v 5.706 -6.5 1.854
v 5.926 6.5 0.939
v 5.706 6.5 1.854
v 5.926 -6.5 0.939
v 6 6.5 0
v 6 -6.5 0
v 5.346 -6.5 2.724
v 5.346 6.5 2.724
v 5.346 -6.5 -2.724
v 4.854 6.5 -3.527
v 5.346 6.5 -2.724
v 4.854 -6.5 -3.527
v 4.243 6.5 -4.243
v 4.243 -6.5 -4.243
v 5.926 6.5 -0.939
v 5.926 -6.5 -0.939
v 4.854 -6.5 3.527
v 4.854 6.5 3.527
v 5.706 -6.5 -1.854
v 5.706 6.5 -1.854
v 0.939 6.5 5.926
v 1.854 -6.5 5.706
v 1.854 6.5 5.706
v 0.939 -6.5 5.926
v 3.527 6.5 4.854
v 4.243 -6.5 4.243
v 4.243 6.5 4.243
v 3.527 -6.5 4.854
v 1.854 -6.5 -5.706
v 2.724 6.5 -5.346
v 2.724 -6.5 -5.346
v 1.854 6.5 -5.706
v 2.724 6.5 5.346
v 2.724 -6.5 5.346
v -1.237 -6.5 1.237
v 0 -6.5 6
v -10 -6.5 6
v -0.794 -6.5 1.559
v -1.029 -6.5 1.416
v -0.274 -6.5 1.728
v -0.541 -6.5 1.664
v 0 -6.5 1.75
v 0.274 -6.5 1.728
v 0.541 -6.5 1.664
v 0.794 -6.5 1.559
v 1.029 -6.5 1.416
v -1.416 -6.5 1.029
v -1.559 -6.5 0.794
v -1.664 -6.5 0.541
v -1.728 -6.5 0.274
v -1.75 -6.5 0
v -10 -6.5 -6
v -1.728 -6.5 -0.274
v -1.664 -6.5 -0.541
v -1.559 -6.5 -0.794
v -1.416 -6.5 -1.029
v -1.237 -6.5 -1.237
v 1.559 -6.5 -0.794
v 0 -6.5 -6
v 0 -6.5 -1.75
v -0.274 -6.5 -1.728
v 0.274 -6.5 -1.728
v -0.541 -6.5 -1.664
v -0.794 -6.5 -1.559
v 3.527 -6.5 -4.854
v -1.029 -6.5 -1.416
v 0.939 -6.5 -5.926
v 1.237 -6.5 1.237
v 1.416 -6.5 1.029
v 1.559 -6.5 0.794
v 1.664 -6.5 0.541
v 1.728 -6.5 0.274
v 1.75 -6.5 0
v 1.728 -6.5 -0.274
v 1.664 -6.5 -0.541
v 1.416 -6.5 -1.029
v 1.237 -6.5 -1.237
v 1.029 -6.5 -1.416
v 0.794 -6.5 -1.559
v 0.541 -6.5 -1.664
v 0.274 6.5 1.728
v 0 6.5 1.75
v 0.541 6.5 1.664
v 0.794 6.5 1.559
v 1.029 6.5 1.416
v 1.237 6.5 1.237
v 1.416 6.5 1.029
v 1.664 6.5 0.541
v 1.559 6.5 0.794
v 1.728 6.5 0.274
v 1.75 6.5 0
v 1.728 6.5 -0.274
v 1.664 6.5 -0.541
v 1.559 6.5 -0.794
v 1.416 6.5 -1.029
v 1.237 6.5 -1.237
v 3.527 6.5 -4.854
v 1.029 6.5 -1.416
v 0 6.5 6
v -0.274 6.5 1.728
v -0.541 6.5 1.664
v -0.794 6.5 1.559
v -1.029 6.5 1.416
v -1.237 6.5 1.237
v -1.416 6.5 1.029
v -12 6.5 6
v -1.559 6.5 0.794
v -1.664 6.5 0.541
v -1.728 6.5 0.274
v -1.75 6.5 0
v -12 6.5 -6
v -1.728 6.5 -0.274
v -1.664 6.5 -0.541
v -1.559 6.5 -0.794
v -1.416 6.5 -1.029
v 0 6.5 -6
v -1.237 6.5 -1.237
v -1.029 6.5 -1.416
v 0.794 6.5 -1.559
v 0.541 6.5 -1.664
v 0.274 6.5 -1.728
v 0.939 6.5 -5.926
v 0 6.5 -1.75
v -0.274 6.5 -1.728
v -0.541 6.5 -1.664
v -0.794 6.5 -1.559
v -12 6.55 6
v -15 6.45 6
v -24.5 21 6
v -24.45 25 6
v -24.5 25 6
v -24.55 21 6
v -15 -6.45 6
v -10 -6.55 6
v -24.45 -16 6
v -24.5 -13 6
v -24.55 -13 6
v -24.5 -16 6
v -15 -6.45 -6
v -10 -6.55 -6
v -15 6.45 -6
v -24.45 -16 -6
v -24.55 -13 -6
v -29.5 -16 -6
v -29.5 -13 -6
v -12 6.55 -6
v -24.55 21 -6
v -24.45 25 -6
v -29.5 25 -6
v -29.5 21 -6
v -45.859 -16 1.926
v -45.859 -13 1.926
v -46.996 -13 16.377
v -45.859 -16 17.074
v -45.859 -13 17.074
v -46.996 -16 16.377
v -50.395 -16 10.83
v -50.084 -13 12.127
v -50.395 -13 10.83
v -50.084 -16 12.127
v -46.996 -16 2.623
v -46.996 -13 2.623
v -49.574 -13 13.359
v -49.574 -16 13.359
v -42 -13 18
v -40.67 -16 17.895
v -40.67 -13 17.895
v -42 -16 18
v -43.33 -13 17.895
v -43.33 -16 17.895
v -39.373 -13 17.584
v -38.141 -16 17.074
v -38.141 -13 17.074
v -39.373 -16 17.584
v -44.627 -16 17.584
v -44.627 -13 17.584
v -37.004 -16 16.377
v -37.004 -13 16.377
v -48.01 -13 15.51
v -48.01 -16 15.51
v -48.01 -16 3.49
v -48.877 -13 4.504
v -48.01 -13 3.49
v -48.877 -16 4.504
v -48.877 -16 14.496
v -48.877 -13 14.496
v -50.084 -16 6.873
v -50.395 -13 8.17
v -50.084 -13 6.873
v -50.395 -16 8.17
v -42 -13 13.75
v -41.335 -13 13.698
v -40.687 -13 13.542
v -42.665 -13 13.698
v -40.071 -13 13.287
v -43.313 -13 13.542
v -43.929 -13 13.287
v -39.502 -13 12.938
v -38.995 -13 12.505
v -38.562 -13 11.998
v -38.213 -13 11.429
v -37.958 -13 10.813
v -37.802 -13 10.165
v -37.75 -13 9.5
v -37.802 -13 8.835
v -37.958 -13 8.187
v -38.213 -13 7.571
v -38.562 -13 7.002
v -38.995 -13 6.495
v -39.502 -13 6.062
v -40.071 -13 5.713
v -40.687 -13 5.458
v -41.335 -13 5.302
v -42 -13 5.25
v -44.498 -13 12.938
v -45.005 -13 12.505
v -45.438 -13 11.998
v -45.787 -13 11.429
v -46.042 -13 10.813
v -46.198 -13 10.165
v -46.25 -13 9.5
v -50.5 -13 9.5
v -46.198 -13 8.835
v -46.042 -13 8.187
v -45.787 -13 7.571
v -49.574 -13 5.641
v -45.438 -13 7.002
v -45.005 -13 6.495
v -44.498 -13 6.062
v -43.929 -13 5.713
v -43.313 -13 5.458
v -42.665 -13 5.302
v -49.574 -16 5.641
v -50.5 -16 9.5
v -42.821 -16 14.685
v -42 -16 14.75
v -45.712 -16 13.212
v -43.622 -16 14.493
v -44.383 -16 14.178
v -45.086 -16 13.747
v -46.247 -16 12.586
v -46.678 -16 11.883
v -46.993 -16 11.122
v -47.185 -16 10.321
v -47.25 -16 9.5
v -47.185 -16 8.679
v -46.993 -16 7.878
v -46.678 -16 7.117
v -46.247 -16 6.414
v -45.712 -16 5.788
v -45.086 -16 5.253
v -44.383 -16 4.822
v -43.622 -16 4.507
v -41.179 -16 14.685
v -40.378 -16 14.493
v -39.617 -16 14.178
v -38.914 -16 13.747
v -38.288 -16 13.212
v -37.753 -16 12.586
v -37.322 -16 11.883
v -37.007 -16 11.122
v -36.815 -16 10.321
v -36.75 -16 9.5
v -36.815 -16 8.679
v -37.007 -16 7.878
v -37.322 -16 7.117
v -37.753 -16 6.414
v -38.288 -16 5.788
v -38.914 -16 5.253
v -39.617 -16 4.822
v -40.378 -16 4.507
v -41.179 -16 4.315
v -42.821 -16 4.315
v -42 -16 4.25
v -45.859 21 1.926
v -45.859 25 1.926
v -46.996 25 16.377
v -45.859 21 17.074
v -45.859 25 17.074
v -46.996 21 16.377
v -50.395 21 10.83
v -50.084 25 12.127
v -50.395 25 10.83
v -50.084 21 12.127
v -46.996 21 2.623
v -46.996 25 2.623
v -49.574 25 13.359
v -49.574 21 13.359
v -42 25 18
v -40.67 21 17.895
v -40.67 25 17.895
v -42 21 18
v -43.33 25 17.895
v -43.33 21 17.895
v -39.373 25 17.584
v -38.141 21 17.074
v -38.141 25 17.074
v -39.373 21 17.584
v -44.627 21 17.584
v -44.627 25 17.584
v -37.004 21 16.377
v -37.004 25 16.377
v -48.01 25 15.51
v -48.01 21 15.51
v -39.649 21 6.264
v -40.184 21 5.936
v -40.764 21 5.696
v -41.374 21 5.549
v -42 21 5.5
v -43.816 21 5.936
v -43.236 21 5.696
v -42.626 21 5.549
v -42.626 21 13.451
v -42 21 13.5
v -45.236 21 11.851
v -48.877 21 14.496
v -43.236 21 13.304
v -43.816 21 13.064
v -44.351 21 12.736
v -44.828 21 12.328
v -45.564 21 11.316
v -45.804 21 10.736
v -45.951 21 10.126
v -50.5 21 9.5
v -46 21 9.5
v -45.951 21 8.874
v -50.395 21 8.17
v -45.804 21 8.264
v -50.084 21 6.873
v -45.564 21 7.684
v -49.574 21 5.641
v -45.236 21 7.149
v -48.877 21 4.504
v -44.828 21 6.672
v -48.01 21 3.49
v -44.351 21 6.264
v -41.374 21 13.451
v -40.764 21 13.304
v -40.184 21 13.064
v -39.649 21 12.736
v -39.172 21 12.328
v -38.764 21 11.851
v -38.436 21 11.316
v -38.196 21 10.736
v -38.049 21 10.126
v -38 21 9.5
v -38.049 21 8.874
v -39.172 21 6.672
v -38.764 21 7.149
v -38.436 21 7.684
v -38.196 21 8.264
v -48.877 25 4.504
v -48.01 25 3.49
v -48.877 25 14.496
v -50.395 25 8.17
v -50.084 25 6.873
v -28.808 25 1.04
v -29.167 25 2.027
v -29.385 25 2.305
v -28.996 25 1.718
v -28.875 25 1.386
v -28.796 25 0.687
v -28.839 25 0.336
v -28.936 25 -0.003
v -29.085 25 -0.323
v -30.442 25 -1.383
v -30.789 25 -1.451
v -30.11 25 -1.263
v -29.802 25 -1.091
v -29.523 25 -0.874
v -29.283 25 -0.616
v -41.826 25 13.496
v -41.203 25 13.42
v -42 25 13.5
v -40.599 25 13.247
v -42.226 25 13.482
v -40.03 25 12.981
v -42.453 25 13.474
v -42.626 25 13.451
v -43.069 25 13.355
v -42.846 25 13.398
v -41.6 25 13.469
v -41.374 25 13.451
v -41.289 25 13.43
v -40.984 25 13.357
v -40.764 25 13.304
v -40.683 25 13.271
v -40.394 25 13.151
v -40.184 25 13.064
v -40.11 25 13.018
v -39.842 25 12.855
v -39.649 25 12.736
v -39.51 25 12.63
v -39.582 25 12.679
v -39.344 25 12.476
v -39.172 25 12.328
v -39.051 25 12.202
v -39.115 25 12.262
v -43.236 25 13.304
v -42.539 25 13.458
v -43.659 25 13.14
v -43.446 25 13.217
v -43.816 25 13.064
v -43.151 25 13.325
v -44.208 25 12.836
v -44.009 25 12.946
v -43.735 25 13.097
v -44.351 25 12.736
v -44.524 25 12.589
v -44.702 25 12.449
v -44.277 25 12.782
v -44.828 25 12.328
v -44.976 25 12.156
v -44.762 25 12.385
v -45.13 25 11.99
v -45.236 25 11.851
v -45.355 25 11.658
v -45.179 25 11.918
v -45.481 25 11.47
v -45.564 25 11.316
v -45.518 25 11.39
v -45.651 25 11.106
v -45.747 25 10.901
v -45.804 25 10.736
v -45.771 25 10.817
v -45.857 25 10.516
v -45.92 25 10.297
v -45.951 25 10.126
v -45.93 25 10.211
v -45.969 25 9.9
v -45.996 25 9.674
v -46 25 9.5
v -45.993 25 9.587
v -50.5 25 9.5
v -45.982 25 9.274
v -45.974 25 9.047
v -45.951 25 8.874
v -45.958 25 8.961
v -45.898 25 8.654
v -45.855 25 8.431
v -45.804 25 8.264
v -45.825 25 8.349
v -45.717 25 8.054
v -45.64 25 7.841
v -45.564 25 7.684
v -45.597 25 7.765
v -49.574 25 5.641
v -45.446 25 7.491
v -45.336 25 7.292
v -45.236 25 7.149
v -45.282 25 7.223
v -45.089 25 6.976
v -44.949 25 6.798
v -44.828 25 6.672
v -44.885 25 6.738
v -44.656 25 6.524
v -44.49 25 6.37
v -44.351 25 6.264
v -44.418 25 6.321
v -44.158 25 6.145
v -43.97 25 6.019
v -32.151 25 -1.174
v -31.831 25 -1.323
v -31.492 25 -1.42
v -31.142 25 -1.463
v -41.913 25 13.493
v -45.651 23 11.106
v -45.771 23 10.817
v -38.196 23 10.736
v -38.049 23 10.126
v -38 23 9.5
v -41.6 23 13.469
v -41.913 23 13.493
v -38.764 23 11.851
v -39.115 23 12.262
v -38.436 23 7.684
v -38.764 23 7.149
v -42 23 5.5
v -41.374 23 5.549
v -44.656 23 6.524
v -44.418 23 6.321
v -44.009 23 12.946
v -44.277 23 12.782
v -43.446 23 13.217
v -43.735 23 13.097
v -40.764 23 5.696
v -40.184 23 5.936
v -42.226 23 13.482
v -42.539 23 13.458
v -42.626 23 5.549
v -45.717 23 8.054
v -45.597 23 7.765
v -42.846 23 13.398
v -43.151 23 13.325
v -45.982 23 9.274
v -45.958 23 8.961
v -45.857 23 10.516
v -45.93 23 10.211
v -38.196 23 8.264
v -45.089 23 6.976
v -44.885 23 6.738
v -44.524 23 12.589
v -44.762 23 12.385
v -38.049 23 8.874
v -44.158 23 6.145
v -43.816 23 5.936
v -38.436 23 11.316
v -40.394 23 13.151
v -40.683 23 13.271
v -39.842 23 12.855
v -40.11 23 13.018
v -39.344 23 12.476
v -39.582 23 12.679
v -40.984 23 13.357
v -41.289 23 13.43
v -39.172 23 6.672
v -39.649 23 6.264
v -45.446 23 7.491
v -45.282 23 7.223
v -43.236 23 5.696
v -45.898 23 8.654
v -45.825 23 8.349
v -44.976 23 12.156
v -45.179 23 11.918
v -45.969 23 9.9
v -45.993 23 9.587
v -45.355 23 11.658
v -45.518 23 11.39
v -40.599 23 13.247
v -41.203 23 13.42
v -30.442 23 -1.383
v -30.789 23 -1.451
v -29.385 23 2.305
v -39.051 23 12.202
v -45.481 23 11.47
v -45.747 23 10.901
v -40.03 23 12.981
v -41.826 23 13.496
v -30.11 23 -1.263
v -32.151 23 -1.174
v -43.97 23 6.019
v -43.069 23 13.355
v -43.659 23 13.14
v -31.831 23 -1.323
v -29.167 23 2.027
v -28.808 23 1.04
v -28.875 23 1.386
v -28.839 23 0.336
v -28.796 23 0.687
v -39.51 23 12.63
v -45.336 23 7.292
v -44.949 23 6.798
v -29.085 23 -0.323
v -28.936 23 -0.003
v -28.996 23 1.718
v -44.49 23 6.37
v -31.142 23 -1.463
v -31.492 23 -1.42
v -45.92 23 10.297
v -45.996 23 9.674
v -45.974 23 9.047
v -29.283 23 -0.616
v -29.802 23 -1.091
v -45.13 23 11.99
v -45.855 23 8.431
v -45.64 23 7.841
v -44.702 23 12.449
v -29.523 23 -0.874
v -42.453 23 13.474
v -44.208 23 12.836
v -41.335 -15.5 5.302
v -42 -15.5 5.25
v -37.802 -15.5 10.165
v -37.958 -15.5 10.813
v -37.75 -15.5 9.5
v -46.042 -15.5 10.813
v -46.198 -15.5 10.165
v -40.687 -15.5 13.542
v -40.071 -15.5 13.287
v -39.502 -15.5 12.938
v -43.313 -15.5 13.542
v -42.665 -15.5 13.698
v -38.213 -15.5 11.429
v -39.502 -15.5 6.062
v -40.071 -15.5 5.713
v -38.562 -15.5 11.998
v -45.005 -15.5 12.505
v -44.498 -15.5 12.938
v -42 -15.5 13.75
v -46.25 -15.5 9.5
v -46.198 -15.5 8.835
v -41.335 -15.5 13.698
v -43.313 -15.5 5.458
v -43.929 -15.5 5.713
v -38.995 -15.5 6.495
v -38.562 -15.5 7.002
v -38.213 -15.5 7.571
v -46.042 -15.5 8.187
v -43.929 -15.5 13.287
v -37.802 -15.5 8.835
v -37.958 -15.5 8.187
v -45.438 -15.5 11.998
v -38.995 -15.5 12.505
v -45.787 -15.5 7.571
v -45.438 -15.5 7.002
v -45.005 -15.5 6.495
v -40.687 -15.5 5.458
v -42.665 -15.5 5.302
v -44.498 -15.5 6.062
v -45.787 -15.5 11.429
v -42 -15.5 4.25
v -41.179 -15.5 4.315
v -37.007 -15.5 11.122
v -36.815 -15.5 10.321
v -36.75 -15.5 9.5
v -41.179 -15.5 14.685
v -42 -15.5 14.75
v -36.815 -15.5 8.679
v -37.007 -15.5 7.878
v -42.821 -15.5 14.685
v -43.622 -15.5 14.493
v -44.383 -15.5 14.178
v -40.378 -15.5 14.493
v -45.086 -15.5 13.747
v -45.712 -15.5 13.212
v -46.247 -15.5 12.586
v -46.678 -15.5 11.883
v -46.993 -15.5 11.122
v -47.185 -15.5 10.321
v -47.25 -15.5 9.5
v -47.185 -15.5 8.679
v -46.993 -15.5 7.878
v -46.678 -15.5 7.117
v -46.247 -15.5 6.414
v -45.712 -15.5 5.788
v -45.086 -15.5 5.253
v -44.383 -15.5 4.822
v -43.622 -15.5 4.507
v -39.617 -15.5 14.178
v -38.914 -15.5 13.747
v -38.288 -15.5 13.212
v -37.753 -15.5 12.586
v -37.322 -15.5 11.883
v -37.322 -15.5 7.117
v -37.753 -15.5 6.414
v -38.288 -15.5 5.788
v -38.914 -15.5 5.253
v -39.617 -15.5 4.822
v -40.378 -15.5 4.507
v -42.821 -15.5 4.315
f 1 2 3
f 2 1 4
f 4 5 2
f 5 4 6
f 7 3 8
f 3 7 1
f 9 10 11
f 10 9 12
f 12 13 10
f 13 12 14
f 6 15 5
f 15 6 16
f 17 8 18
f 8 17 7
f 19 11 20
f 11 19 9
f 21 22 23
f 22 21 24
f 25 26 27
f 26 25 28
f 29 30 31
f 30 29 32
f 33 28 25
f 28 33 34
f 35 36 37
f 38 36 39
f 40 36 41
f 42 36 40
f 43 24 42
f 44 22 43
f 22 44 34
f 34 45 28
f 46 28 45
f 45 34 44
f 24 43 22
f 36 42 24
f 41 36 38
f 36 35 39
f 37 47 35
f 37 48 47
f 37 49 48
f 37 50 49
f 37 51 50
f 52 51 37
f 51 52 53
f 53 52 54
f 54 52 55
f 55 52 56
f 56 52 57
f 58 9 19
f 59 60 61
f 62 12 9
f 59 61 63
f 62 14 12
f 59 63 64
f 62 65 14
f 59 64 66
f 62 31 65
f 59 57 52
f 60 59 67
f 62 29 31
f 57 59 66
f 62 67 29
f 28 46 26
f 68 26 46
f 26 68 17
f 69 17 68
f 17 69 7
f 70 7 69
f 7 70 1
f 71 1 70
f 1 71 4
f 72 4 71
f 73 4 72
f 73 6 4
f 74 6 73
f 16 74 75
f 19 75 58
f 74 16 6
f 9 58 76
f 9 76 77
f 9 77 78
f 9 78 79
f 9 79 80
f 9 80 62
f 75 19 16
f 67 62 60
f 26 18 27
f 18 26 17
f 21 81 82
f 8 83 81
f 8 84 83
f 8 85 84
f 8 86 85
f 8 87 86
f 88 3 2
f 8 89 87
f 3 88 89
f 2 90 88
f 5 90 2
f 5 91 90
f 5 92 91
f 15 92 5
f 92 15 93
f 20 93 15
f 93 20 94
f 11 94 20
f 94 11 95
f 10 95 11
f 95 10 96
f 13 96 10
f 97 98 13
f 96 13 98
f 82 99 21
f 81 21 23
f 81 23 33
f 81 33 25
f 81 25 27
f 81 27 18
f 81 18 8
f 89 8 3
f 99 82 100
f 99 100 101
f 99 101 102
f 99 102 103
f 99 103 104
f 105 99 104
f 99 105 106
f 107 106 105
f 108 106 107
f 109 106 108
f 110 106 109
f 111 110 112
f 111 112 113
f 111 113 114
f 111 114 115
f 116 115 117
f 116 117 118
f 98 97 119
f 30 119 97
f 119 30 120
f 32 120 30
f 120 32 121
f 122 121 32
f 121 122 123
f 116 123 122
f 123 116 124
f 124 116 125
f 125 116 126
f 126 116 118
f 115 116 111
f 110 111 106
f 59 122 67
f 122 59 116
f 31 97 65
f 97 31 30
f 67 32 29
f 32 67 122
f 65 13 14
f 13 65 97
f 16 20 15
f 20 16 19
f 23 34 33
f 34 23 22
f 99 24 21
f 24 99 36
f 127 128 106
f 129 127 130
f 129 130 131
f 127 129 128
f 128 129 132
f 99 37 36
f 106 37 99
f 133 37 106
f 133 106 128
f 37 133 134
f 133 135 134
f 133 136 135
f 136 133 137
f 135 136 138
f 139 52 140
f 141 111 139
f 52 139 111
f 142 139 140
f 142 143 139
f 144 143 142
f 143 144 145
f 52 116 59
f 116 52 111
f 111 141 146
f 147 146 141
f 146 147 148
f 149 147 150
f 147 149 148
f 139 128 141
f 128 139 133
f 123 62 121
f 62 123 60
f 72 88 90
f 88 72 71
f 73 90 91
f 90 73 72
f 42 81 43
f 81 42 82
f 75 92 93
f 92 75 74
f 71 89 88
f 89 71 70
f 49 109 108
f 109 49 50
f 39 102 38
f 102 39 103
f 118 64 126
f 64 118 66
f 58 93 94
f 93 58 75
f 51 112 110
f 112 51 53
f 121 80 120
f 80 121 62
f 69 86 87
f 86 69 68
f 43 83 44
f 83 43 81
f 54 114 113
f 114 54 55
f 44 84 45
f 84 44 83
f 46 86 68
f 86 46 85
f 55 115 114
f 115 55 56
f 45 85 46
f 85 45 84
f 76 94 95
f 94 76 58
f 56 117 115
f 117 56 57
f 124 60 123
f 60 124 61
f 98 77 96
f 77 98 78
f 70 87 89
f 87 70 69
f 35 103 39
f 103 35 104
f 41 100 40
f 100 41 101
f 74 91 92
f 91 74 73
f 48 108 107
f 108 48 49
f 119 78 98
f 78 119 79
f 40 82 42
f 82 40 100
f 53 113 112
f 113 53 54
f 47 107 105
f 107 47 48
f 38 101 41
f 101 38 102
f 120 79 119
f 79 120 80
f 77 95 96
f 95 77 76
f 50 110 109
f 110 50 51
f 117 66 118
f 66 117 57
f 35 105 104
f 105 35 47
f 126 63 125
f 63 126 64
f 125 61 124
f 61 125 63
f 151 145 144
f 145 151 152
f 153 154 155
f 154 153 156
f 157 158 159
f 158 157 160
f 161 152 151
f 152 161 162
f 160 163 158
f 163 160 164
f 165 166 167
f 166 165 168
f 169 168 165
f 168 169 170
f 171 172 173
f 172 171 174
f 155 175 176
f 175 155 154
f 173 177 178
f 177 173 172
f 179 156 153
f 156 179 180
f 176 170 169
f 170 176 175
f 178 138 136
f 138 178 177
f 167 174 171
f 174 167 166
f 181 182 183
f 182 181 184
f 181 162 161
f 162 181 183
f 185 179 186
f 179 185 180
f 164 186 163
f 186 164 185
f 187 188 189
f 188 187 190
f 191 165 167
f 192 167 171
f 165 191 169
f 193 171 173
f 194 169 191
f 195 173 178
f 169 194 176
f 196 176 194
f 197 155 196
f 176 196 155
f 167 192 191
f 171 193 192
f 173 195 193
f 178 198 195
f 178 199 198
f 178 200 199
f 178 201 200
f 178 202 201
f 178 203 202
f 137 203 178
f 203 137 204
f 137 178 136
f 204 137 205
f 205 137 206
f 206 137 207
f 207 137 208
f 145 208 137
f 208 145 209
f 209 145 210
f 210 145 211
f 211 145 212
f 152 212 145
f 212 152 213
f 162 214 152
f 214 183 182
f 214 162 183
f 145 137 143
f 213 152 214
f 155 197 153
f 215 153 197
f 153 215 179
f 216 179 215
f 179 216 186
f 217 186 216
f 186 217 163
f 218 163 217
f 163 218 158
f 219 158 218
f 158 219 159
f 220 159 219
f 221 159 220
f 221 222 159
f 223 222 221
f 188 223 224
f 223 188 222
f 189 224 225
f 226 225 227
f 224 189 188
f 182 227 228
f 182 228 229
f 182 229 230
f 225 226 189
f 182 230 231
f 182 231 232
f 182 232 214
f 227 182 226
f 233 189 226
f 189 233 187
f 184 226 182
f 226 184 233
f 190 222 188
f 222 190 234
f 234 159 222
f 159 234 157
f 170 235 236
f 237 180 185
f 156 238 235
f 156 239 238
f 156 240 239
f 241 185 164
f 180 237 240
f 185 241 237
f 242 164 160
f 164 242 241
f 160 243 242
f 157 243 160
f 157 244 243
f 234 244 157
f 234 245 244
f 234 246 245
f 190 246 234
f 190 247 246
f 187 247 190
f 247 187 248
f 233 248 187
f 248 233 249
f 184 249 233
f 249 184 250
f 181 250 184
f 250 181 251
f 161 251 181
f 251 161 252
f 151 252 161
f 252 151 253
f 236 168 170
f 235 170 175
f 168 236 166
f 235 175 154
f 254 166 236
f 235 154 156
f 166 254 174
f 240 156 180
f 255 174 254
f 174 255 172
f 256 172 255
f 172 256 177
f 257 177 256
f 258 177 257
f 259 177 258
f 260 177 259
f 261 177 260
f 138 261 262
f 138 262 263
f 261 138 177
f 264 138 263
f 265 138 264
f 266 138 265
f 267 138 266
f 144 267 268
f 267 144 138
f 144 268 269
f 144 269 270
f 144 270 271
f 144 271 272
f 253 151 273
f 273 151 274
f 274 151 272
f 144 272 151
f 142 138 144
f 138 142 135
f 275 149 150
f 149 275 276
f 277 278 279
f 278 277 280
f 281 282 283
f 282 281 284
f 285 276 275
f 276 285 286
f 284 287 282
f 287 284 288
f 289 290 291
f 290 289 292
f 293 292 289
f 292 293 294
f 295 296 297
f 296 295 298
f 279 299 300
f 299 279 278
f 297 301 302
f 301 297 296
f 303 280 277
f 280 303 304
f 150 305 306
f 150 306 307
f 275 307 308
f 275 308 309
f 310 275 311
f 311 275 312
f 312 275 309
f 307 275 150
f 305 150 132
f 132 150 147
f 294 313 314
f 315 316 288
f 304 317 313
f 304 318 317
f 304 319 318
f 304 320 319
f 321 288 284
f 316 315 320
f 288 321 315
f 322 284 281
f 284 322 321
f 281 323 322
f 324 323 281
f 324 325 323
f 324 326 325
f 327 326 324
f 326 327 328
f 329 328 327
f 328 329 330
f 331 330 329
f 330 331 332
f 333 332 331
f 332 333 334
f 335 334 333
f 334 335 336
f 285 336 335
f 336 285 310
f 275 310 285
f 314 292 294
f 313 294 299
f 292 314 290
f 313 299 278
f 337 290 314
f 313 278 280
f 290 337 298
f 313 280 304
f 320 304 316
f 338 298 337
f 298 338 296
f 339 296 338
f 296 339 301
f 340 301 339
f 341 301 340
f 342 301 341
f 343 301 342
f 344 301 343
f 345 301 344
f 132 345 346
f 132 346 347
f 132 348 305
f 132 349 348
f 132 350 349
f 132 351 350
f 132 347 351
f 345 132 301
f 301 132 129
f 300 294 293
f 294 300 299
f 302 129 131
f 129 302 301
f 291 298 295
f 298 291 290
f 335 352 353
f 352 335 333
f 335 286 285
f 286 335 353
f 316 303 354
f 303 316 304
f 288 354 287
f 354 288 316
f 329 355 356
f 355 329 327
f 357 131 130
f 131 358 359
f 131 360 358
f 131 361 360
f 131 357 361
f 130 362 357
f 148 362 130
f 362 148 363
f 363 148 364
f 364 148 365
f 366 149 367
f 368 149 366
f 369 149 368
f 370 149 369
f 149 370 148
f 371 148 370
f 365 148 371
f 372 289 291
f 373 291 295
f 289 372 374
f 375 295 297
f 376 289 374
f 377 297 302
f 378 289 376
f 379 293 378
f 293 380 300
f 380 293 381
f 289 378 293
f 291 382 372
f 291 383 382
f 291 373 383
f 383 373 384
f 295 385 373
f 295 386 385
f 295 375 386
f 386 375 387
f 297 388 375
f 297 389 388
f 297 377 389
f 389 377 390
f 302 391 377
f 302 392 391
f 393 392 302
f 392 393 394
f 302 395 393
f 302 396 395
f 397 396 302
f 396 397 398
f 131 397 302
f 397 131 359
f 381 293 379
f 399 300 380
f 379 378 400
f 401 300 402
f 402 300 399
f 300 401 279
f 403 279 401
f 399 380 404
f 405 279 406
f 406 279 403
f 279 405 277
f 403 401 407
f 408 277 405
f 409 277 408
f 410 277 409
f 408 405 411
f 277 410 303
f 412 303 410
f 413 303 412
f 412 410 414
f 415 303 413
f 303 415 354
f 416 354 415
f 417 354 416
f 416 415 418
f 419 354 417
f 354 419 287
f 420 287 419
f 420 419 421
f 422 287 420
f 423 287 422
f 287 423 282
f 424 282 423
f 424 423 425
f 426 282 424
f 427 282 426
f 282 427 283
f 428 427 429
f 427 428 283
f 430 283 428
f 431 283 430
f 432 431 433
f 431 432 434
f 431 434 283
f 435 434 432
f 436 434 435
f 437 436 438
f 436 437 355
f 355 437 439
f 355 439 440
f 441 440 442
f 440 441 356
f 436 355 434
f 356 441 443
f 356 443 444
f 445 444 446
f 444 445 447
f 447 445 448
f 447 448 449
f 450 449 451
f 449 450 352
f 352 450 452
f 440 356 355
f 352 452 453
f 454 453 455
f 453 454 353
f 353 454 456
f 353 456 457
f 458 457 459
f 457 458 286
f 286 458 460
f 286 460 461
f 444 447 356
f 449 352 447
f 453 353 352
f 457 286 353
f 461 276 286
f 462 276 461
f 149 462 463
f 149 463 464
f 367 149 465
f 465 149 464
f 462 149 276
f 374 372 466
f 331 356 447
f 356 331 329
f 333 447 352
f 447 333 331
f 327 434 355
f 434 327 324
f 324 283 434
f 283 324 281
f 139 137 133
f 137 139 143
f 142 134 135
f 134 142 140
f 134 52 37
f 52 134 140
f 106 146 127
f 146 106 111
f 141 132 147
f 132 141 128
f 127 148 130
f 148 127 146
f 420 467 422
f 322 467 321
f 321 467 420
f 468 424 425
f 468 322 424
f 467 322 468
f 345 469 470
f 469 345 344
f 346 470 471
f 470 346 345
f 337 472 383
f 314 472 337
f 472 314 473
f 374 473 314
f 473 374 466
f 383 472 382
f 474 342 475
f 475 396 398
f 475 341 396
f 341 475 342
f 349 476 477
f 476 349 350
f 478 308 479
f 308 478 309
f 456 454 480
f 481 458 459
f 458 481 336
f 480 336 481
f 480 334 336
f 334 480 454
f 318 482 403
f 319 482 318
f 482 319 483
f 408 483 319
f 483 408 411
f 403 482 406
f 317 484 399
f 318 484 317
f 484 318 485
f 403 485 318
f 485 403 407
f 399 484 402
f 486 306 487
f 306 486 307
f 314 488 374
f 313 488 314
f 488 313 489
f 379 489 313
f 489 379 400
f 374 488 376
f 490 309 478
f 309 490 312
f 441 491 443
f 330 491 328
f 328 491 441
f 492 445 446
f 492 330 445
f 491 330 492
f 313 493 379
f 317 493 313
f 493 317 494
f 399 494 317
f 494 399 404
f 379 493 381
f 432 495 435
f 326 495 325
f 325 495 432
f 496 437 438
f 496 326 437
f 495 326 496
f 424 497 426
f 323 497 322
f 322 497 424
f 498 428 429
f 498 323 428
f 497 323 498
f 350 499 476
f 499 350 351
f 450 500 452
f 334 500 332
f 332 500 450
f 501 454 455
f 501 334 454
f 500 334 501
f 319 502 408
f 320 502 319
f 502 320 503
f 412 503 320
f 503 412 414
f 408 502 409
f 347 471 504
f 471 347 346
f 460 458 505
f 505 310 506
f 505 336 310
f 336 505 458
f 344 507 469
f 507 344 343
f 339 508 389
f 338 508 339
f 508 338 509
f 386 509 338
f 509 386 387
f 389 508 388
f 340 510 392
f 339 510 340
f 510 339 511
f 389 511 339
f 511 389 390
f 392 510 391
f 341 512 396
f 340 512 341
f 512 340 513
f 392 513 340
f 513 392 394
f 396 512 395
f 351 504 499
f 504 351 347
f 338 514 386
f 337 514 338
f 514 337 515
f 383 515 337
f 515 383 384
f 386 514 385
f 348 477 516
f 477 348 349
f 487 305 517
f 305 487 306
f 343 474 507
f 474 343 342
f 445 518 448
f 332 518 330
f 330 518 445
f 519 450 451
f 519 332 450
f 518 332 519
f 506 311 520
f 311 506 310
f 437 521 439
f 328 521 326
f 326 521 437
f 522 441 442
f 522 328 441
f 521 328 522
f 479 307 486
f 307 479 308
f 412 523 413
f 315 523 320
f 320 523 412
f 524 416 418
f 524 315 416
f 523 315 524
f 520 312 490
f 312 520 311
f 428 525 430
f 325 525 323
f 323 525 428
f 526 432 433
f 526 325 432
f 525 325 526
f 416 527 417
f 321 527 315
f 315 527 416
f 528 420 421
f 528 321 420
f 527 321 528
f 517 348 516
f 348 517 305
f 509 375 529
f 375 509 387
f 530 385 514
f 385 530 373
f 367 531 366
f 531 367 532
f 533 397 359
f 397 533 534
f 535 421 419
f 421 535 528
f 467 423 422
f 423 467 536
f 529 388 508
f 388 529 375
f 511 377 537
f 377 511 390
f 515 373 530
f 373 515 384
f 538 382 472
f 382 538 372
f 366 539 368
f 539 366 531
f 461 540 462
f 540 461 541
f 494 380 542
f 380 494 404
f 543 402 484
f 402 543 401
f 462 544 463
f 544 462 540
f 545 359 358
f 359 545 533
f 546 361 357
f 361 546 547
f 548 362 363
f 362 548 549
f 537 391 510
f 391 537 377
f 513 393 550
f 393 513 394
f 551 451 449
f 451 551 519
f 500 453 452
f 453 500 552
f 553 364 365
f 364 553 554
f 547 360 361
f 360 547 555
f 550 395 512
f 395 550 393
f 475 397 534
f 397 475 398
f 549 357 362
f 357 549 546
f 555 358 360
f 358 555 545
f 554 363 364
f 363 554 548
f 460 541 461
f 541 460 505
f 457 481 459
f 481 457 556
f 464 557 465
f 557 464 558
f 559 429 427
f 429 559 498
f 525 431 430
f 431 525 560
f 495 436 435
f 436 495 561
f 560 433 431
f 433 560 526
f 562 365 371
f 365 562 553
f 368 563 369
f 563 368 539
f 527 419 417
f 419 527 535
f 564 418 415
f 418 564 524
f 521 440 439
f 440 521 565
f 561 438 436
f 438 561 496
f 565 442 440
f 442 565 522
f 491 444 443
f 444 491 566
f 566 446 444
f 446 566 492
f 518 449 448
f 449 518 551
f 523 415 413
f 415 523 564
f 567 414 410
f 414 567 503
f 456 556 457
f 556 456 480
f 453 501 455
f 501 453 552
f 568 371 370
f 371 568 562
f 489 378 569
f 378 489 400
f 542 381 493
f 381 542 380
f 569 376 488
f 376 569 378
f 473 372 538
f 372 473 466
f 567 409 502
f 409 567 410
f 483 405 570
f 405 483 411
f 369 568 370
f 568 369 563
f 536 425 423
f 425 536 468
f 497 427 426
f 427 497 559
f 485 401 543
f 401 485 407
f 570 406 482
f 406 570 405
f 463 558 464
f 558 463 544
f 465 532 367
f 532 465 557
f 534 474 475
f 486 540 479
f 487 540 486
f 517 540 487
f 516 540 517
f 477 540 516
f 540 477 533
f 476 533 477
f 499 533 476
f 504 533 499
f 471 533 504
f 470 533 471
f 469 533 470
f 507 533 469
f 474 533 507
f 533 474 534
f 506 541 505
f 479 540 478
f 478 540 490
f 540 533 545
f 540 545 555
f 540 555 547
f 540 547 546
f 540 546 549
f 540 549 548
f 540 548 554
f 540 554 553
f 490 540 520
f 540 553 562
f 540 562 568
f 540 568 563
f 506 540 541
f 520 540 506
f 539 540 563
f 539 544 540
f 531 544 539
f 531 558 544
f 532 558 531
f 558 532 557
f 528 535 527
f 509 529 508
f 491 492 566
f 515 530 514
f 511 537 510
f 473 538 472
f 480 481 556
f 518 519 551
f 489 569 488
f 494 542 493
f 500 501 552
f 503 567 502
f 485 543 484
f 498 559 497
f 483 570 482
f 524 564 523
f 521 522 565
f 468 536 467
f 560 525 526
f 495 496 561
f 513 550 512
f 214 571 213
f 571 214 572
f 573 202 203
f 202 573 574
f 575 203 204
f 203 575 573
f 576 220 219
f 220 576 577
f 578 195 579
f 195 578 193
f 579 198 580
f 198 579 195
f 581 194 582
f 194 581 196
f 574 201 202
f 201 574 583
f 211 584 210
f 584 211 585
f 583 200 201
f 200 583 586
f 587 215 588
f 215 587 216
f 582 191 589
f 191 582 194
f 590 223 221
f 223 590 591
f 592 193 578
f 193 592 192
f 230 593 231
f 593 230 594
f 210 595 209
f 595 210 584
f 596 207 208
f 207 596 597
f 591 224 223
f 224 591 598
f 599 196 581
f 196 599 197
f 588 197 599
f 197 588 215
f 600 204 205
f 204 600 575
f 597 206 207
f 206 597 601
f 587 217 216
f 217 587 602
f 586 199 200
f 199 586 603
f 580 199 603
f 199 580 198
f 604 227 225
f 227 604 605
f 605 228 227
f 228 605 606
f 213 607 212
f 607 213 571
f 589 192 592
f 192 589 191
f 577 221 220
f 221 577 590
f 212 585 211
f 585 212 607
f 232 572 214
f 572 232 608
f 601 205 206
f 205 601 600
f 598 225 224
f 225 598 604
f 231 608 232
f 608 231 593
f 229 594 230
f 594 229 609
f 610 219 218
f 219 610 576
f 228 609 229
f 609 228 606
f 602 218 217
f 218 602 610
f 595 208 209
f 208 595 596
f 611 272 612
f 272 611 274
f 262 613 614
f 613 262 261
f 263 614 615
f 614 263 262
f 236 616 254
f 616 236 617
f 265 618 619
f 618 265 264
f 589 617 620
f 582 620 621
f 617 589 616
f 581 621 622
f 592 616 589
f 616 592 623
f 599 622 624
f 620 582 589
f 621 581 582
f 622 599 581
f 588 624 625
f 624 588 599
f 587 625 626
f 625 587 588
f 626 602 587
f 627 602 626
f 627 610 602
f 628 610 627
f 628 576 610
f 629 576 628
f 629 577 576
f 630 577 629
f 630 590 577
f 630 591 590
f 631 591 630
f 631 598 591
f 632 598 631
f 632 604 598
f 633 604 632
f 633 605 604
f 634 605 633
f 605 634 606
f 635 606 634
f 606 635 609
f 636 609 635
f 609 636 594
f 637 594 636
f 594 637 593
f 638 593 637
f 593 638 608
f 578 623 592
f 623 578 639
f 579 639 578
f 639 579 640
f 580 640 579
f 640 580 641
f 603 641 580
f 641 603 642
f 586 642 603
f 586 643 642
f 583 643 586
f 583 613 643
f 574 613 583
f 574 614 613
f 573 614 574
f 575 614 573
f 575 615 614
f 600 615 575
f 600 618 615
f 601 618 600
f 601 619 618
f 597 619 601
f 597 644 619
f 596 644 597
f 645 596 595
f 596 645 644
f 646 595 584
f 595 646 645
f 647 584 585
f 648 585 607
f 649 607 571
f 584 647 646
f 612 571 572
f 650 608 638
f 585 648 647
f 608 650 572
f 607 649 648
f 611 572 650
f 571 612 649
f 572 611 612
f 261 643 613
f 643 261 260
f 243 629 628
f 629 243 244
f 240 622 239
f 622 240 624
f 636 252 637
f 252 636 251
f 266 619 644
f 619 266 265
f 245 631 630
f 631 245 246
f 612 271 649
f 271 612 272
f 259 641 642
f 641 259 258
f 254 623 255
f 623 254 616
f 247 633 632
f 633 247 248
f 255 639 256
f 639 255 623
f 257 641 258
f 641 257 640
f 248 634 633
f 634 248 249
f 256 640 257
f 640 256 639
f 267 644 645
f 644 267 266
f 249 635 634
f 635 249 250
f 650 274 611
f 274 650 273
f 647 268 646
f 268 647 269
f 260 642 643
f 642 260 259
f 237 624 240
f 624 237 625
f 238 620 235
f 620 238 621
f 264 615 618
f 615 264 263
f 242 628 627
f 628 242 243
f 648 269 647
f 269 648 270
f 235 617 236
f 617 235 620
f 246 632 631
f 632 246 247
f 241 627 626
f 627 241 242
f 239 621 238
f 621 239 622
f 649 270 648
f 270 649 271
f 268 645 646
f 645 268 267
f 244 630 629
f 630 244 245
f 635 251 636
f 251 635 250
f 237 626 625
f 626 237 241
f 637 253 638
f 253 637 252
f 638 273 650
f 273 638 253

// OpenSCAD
$fn=40;
//union() {
//	import("leftLegB.stl");
//	difference() {
//		color("red") translate([47,-50,7]) rotate([90,38.5,0]) hull() {
//			cylinder(h=2,d=9,center=true);
//			translate([19.25,0,0]) cylinder(h=2,d=5.5,center=true);
//		}
//		translate([47,-50,7]) rotate([90,38.5,0]) hull() {
//			cylinder(h=2,d=7.5,center=true);
//			translate([14,0,0]) cylinder(h=2,d=4.5,center=true);
//		}
//	}
//}
//translate([89,-27.5+1.5,-3]) {
mirror([0,1,0]) {
difference() {
	union() {
		difference() {
			union() {
				rotate([90,0,0]) cylinder(h=13,d=12,center=true);
				translate([-15/2,0,0]) cube([15,13,12],center=true);
			}
			rotate([90,0,0]) cylinder(h=15,d=3.5,center=true);
		}
		translate([0,37,0]) hull() {
			translate([-27,-22-0.5,0]) cube([5,3,12],center=true);
			translate([-42,-22-0.5,18-17/2]) rotate([90,0,0]) cylinder(h=3,d=17,center=true);
		}
		hull() {
			translate([-27,-22-1,0]) cube([5,4,12],center=true);
			translate([-42,-22-1,18-17/2]) rotate([90,0,0]) cylinder(h=4,d=17,center=true);
		}
		hull() {
			translate([-12.5,6.5,0]) cube([5,0.1,12],center=true);
			translate([-24.5,37-22-0.5,0]) cube([0.1,3,12],center=true);
		}
		hull() {
			translate([-13.5,-6.5,0]) cube([3,0.1,12],center=true);
			translate([-24.5,-22-1,0]) cube([0.1,4,12],center=true);
		}
	}
	union() {
		translate([-42,-25,18-17/2]) {
			rotate([90,0,0]) cylinder(h=10,d=8,center=true);
			rotate([90,38.5,0]) hull() {
				cylinder(h=4,d=8,center=true);
				translate([14,0,0]) cylinder(h=4,d=4.5,center=true);
			}
		}
		translate([-42,37-22-0.5,18-17/2]) {
			translate([0,-1,0]) rotate([90,0,0]) cylinder(h=6,d=8.5,center=true);
			translate([0,2,0]) rotate([90,0,0]) cylinder(h=2,d=10.5,center=true);
		}
	}
}
}
